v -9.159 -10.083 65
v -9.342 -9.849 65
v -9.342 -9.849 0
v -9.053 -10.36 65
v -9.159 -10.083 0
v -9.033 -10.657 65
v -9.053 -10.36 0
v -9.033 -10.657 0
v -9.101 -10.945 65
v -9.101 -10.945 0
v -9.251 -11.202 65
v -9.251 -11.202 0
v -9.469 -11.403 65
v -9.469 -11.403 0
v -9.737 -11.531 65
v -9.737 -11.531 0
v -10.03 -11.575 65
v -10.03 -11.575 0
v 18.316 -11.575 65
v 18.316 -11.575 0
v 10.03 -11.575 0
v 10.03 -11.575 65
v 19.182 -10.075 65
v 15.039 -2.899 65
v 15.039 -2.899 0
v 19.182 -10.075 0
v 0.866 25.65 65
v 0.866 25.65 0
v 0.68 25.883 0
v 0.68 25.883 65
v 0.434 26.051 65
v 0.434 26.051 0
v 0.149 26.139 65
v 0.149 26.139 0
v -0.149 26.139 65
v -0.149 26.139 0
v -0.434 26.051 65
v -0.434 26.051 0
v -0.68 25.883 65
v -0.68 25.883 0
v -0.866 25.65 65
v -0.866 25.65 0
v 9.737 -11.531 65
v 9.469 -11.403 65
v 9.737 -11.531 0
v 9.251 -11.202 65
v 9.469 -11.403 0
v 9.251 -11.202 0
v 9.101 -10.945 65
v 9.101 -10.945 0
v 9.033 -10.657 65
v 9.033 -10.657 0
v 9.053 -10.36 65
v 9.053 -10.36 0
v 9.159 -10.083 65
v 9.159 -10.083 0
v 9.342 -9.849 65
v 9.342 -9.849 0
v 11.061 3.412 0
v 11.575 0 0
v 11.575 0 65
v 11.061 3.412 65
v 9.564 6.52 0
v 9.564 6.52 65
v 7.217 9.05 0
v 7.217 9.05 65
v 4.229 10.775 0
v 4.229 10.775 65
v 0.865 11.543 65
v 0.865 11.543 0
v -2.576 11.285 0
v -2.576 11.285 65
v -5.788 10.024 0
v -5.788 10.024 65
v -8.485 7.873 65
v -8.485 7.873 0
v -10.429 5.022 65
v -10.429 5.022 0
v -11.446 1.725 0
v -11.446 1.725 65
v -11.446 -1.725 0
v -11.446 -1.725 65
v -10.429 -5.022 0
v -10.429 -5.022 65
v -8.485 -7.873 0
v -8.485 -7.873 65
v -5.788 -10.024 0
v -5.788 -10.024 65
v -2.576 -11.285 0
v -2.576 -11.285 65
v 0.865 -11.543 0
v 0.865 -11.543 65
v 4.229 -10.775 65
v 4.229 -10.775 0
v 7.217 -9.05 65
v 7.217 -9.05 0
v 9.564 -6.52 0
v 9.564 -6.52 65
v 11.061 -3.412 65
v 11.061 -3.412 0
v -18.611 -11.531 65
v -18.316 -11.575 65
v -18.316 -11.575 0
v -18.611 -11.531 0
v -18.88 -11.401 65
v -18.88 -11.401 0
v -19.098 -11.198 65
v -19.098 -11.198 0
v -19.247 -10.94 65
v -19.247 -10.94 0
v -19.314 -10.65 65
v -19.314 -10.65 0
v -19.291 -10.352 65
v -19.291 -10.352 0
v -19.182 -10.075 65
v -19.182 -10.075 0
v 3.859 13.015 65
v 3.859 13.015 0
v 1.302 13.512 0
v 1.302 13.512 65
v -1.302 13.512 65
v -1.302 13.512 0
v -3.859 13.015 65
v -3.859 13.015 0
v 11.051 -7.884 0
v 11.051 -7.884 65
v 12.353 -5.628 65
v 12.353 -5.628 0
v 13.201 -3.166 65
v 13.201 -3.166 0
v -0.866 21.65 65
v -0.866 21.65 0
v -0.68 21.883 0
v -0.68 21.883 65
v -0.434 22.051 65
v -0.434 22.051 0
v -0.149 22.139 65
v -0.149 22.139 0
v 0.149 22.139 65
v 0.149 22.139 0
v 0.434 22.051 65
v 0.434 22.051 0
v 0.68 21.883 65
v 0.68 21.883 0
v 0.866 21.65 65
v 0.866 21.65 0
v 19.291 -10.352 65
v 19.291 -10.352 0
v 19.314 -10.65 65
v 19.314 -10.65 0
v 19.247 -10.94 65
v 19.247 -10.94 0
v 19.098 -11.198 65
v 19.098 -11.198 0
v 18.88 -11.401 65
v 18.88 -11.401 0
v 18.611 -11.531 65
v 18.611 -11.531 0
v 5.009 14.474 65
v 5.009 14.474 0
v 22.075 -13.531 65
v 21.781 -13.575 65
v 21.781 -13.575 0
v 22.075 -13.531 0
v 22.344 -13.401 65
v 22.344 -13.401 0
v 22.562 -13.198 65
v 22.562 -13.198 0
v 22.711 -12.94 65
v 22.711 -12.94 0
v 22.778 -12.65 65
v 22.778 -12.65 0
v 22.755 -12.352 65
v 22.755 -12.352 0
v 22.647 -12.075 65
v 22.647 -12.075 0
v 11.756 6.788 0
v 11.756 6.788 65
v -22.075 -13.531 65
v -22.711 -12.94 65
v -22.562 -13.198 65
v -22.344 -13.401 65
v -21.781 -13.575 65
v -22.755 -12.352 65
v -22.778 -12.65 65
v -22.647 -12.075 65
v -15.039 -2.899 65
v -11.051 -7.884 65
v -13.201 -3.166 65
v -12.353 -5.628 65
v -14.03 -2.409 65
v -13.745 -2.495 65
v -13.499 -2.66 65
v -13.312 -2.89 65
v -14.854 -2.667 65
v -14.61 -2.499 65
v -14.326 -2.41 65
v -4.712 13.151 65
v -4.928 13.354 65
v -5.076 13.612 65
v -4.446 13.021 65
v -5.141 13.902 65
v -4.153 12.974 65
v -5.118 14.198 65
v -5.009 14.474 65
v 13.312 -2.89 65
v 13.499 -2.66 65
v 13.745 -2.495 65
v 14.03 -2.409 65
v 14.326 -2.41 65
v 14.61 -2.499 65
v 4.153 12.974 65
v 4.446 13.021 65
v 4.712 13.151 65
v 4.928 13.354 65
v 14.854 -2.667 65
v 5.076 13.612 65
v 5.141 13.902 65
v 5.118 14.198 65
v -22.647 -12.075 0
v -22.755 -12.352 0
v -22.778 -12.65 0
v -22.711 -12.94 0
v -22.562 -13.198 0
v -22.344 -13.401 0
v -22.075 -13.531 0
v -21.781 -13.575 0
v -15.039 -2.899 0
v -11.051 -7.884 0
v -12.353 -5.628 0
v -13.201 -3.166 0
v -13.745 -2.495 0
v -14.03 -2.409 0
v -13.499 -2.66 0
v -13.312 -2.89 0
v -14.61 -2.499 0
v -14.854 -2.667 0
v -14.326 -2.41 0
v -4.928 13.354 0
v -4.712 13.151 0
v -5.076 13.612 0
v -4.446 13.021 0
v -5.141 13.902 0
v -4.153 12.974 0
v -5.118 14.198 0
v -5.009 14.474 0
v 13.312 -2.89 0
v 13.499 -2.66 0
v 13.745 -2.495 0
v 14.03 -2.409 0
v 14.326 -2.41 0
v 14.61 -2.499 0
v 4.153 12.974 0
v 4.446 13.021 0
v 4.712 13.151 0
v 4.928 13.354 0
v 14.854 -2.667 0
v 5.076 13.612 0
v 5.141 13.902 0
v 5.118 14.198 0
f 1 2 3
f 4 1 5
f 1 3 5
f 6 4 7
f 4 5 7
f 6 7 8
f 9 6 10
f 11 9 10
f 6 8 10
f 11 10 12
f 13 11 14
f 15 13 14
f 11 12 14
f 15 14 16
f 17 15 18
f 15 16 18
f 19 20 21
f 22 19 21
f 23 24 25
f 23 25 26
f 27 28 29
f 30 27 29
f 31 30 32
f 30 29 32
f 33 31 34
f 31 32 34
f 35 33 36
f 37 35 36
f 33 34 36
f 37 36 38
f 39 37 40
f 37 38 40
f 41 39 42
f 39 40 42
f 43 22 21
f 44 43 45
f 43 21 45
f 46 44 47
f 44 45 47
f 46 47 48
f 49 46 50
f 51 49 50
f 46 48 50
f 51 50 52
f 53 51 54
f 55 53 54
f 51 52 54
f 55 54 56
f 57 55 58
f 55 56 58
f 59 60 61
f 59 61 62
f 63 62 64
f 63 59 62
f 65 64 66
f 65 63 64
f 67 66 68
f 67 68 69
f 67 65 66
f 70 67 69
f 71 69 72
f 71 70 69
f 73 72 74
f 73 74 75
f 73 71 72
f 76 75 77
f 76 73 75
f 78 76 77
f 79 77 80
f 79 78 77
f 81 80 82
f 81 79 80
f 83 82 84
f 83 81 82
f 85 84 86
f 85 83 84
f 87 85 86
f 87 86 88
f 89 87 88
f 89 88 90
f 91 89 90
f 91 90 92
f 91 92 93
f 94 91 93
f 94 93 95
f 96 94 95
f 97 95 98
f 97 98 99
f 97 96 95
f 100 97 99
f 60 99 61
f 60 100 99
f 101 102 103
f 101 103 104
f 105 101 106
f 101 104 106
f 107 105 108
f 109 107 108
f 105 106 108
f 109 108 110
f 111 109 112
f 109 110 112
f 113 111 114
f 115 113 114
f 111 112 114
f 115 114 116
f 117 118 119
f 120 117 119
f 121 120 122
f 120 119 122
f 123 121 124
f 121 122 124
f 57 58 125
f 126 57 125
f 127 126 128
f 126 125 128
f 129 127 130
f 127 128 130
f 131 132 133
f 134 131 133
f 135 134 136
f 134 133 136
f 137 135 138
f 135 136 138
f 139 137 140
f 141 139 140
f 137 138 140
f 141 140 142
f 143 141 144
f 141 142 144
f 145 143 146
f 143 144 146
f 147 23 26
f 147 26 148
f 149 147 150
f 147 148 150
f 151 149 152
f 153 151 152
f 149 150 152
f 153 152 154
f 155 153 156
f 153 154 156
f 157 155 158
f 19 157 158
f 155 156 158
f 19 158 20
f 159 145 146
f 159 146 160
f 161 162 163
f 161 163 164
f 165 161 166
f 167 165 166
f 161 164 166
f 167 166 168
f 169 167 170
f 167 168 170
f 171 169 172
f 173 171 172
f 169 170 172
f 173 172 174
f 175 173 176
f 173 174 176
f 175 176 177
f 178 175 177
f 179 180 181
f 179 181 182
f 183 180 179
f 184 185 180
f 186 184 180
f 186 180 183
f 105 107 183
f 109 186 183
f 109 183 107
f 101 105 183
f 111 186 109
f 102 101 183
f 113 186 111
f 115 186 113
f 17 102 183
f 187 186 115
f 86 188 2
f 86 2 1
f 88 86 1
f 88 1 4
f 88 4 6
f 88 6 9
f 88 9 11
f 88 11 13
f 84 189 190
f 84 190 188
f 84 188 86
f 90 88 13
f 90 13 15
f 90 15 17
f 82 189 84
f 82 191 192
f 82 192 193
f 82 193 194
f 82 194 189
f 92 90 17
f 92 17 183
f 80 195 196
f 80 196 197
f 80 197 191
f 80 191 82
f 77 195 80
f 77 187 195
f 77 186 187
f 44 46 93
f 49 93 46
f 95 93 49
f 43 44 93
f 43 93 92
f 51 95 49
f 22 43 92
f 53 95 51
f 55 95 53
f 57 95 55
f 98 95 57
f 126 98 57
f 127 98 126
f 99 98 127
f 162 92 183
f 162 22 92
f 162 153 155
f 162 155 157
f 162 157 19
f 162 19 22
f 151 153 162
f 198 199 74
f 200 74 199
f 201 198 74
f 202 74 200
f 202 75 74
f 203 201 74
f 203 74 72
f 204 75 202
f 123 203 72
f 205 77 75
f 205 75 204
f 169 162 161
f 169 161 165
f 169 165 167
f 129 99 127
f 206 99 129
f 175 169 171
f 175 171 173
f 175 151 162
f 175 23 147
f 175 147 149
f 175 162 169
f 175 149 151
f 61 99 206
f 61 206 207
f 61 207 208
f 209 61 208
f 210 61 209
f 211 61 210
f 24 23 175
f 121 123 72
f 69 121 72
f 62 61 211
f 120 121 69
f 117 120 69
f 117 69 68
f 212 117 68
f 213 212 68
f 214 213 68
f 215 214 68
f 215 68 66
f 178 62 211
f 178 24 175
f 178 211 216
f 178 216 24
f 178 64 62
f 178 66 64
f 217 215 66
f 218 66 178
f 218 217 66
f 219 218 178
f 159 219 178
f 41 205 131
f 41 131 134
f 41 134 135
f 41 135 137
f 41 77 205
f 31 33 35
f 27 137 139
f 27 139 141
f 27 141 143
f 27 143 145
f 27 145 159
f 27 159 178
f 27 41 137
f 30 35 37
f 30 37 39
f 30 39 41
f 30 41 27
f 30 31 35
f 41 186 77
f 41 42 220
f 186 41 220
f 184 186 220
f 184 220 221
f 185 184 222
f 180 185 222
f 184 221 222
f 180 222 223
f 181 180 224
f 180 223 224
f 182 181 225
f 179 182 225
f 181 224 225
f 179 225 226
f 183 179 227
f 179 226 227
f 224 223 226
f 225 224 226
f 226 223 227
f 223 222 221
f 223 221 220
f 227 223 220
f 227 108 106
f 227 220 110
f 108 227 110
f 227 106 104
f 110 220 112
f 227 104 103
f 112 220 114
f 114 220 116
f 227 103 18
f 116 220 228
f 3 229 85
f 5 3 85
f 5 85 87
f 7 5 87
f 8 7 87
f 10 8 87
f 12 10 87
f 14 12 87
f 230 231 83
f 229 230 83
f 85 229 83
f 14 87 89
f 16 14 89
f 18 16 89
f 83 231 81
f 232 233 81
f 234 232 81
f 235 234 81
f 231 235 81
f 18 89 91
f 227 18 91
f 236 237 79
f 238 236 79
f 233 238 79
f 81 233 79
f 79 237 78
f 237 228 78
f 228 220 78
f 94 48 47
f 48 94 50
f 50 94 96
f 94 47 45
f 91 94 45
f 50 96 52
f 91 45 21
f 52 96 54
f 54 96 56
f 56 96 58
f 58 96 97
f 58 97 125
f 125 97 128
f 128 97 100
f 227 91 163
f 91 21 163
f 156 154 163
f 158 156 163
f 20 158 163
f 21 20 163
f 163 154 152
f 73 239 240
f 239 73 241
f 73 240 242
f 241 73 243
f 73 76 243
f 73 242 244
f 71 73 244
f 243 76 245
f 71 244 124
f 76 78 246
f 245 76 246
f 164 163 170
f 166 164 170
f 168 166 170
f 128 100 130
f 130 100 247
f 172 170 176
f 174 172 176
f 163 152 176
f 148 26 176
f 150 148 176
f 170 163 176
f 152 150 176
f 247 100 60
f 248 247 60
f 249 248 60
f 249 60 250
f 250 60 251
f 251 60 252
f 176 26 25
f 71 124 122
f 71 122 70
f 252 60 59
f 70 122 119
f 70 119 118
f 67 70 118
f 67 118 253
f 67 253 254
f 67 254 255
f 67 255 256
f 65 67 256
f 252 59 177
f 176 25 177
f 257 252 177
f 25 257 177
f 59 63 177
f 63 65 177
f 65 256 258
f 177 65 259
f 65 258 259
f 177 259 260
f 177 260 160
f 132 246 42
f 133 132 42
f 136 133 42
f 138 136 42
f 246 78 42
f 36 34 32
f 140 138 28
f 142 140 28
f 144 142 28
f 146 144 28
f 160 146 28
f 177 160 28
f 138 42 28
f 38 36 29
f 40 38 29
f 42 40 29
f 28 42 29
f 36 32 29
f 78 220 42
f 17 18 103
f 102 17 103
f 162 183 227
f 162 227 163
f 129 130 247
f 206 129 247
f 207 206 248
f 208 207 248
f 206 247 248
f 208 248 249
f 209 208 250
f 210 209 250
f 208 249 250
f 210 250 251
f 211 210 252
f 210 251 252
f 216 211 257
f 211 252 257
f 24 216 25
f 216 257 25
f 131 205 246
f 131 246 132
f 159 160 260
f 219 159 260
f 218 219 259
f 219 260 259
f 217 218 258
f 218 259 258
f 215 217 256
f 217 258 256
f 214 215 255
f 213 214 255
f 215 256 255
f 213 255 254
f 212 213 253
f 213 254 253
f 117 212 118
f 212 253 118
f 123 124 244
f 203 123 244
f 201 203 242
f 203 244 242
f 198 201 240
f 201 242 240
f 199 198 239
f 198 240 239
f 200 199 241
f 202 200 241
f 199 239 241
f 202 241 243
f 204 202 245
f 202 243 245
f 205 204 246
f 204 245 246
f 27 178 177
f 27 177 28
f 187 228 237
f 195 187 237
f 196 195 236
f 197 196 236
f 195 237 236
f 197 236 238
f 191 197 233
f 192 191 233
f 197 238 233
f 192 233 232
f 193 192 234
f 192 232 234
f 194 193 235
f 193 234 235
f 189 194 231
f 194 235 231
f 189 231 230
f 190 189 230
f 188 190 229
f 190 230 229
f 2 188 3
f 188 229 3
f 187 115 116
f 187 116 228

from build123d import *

# Parameters (mm, degrees)
F0_R     = 11.575
F1_DEPTH = 65


with BuildPart() as f1:
    # F0 (on Top) → F1 (new body)
    with BuildSketch(Plane.XY):
        with BuildLine():
            Line((11.756295, 6.7875), (0.866025, 25.65))
            ThreePointArc((0.866025, 25.65), (0, 26.15), (-0.866025, 25.65))
            Line((-0.866025, 25.65), (-22.646564, -12.075))
            ThreePointArc((-22.646564, -12.075), (-22.646564, -13.075), (-21.780539, -13.575))
            Line((-21.780539, -13.575), (21.780539, -13.575))
            ThreePointArc((21.780539, -13.575), (22.646564, -13.075), (22.646564, -12.075))
            Line((22.646564, -12.075), (11.756295, 6.7875))
        make_face()
        with BuildLine():
            ThreePointArc((-18.316437, -11.575), (-19.182463, -11.075), (-19.182463, -10.075))
            Line((-19.182463, -10.075), (-15.039222, -2.898696))
            ThreePointArc((-15.039222, -2.898696), (-14.029572, -2.409064), (-13.200764, -3.165509))
            ThreePointArc((-13.200764, -3.165509), (-11.756295, -6.7875), (-9.341794, -9.849443))
            ThreePointArc((-9.341794, -9.849443), (-9.101096, -10.945434), (-10.029955, -11.575))
            Line((-10.029955, -11.575), (-18.316437, -11.575))
        make_face(mode=Mode.SUBTRACT)
        Circle(F0_R, mode=Mode.SUBTRACT)
        with BuildLine():
            ThreePointArc((19.182463, -10.075), (19.182463, -11.075), (18.316437, -11.575))
            Line((18.316437, -11.575), (10.029955, -11.575))
            ThreePointArc((10.029955, -11.575), (9.101096, -10.945434), (9.341794, -9.849443))
            ThreePointArc((9.341794, -9.849443), (11.756295, -6.7875), (13.200764, -3.165509))
            ThreePointArc((13.200764, -3.165509), (14.029572, -2.409064), (15.039222, -2.898696))
            Line((15.039222, -2.898696), (19.182463, -10.075))
        make_face(mode=Mode.SUBTRACT)
        with BuildLine():
            ThreePointArc((-0.866025, 21.65), (0, 22.15), (0.866025, 21.65))
            Line((0.866025, 21.65), (5.009266, 14.473696))
            ThreePointArc((5.009266, 14.473696), (4.928476, 13.354498), (3.858971, 13.014952))
            ThreePointArc((3.858971, 13.014952), (0, 13.575), (-3.858971, 13.014952))
            ThreePointArc((-3.858971, 13.014952), (-4.928476, 13.354498), (-5.009266, 14.473696))
            Line((-5.009266, 14.473696), (-0.866025, 21.65))
        make_face(mode=Mode.SUBTRACT)
    extrude(amount=F1_DEPTH)


solid = f1.part
